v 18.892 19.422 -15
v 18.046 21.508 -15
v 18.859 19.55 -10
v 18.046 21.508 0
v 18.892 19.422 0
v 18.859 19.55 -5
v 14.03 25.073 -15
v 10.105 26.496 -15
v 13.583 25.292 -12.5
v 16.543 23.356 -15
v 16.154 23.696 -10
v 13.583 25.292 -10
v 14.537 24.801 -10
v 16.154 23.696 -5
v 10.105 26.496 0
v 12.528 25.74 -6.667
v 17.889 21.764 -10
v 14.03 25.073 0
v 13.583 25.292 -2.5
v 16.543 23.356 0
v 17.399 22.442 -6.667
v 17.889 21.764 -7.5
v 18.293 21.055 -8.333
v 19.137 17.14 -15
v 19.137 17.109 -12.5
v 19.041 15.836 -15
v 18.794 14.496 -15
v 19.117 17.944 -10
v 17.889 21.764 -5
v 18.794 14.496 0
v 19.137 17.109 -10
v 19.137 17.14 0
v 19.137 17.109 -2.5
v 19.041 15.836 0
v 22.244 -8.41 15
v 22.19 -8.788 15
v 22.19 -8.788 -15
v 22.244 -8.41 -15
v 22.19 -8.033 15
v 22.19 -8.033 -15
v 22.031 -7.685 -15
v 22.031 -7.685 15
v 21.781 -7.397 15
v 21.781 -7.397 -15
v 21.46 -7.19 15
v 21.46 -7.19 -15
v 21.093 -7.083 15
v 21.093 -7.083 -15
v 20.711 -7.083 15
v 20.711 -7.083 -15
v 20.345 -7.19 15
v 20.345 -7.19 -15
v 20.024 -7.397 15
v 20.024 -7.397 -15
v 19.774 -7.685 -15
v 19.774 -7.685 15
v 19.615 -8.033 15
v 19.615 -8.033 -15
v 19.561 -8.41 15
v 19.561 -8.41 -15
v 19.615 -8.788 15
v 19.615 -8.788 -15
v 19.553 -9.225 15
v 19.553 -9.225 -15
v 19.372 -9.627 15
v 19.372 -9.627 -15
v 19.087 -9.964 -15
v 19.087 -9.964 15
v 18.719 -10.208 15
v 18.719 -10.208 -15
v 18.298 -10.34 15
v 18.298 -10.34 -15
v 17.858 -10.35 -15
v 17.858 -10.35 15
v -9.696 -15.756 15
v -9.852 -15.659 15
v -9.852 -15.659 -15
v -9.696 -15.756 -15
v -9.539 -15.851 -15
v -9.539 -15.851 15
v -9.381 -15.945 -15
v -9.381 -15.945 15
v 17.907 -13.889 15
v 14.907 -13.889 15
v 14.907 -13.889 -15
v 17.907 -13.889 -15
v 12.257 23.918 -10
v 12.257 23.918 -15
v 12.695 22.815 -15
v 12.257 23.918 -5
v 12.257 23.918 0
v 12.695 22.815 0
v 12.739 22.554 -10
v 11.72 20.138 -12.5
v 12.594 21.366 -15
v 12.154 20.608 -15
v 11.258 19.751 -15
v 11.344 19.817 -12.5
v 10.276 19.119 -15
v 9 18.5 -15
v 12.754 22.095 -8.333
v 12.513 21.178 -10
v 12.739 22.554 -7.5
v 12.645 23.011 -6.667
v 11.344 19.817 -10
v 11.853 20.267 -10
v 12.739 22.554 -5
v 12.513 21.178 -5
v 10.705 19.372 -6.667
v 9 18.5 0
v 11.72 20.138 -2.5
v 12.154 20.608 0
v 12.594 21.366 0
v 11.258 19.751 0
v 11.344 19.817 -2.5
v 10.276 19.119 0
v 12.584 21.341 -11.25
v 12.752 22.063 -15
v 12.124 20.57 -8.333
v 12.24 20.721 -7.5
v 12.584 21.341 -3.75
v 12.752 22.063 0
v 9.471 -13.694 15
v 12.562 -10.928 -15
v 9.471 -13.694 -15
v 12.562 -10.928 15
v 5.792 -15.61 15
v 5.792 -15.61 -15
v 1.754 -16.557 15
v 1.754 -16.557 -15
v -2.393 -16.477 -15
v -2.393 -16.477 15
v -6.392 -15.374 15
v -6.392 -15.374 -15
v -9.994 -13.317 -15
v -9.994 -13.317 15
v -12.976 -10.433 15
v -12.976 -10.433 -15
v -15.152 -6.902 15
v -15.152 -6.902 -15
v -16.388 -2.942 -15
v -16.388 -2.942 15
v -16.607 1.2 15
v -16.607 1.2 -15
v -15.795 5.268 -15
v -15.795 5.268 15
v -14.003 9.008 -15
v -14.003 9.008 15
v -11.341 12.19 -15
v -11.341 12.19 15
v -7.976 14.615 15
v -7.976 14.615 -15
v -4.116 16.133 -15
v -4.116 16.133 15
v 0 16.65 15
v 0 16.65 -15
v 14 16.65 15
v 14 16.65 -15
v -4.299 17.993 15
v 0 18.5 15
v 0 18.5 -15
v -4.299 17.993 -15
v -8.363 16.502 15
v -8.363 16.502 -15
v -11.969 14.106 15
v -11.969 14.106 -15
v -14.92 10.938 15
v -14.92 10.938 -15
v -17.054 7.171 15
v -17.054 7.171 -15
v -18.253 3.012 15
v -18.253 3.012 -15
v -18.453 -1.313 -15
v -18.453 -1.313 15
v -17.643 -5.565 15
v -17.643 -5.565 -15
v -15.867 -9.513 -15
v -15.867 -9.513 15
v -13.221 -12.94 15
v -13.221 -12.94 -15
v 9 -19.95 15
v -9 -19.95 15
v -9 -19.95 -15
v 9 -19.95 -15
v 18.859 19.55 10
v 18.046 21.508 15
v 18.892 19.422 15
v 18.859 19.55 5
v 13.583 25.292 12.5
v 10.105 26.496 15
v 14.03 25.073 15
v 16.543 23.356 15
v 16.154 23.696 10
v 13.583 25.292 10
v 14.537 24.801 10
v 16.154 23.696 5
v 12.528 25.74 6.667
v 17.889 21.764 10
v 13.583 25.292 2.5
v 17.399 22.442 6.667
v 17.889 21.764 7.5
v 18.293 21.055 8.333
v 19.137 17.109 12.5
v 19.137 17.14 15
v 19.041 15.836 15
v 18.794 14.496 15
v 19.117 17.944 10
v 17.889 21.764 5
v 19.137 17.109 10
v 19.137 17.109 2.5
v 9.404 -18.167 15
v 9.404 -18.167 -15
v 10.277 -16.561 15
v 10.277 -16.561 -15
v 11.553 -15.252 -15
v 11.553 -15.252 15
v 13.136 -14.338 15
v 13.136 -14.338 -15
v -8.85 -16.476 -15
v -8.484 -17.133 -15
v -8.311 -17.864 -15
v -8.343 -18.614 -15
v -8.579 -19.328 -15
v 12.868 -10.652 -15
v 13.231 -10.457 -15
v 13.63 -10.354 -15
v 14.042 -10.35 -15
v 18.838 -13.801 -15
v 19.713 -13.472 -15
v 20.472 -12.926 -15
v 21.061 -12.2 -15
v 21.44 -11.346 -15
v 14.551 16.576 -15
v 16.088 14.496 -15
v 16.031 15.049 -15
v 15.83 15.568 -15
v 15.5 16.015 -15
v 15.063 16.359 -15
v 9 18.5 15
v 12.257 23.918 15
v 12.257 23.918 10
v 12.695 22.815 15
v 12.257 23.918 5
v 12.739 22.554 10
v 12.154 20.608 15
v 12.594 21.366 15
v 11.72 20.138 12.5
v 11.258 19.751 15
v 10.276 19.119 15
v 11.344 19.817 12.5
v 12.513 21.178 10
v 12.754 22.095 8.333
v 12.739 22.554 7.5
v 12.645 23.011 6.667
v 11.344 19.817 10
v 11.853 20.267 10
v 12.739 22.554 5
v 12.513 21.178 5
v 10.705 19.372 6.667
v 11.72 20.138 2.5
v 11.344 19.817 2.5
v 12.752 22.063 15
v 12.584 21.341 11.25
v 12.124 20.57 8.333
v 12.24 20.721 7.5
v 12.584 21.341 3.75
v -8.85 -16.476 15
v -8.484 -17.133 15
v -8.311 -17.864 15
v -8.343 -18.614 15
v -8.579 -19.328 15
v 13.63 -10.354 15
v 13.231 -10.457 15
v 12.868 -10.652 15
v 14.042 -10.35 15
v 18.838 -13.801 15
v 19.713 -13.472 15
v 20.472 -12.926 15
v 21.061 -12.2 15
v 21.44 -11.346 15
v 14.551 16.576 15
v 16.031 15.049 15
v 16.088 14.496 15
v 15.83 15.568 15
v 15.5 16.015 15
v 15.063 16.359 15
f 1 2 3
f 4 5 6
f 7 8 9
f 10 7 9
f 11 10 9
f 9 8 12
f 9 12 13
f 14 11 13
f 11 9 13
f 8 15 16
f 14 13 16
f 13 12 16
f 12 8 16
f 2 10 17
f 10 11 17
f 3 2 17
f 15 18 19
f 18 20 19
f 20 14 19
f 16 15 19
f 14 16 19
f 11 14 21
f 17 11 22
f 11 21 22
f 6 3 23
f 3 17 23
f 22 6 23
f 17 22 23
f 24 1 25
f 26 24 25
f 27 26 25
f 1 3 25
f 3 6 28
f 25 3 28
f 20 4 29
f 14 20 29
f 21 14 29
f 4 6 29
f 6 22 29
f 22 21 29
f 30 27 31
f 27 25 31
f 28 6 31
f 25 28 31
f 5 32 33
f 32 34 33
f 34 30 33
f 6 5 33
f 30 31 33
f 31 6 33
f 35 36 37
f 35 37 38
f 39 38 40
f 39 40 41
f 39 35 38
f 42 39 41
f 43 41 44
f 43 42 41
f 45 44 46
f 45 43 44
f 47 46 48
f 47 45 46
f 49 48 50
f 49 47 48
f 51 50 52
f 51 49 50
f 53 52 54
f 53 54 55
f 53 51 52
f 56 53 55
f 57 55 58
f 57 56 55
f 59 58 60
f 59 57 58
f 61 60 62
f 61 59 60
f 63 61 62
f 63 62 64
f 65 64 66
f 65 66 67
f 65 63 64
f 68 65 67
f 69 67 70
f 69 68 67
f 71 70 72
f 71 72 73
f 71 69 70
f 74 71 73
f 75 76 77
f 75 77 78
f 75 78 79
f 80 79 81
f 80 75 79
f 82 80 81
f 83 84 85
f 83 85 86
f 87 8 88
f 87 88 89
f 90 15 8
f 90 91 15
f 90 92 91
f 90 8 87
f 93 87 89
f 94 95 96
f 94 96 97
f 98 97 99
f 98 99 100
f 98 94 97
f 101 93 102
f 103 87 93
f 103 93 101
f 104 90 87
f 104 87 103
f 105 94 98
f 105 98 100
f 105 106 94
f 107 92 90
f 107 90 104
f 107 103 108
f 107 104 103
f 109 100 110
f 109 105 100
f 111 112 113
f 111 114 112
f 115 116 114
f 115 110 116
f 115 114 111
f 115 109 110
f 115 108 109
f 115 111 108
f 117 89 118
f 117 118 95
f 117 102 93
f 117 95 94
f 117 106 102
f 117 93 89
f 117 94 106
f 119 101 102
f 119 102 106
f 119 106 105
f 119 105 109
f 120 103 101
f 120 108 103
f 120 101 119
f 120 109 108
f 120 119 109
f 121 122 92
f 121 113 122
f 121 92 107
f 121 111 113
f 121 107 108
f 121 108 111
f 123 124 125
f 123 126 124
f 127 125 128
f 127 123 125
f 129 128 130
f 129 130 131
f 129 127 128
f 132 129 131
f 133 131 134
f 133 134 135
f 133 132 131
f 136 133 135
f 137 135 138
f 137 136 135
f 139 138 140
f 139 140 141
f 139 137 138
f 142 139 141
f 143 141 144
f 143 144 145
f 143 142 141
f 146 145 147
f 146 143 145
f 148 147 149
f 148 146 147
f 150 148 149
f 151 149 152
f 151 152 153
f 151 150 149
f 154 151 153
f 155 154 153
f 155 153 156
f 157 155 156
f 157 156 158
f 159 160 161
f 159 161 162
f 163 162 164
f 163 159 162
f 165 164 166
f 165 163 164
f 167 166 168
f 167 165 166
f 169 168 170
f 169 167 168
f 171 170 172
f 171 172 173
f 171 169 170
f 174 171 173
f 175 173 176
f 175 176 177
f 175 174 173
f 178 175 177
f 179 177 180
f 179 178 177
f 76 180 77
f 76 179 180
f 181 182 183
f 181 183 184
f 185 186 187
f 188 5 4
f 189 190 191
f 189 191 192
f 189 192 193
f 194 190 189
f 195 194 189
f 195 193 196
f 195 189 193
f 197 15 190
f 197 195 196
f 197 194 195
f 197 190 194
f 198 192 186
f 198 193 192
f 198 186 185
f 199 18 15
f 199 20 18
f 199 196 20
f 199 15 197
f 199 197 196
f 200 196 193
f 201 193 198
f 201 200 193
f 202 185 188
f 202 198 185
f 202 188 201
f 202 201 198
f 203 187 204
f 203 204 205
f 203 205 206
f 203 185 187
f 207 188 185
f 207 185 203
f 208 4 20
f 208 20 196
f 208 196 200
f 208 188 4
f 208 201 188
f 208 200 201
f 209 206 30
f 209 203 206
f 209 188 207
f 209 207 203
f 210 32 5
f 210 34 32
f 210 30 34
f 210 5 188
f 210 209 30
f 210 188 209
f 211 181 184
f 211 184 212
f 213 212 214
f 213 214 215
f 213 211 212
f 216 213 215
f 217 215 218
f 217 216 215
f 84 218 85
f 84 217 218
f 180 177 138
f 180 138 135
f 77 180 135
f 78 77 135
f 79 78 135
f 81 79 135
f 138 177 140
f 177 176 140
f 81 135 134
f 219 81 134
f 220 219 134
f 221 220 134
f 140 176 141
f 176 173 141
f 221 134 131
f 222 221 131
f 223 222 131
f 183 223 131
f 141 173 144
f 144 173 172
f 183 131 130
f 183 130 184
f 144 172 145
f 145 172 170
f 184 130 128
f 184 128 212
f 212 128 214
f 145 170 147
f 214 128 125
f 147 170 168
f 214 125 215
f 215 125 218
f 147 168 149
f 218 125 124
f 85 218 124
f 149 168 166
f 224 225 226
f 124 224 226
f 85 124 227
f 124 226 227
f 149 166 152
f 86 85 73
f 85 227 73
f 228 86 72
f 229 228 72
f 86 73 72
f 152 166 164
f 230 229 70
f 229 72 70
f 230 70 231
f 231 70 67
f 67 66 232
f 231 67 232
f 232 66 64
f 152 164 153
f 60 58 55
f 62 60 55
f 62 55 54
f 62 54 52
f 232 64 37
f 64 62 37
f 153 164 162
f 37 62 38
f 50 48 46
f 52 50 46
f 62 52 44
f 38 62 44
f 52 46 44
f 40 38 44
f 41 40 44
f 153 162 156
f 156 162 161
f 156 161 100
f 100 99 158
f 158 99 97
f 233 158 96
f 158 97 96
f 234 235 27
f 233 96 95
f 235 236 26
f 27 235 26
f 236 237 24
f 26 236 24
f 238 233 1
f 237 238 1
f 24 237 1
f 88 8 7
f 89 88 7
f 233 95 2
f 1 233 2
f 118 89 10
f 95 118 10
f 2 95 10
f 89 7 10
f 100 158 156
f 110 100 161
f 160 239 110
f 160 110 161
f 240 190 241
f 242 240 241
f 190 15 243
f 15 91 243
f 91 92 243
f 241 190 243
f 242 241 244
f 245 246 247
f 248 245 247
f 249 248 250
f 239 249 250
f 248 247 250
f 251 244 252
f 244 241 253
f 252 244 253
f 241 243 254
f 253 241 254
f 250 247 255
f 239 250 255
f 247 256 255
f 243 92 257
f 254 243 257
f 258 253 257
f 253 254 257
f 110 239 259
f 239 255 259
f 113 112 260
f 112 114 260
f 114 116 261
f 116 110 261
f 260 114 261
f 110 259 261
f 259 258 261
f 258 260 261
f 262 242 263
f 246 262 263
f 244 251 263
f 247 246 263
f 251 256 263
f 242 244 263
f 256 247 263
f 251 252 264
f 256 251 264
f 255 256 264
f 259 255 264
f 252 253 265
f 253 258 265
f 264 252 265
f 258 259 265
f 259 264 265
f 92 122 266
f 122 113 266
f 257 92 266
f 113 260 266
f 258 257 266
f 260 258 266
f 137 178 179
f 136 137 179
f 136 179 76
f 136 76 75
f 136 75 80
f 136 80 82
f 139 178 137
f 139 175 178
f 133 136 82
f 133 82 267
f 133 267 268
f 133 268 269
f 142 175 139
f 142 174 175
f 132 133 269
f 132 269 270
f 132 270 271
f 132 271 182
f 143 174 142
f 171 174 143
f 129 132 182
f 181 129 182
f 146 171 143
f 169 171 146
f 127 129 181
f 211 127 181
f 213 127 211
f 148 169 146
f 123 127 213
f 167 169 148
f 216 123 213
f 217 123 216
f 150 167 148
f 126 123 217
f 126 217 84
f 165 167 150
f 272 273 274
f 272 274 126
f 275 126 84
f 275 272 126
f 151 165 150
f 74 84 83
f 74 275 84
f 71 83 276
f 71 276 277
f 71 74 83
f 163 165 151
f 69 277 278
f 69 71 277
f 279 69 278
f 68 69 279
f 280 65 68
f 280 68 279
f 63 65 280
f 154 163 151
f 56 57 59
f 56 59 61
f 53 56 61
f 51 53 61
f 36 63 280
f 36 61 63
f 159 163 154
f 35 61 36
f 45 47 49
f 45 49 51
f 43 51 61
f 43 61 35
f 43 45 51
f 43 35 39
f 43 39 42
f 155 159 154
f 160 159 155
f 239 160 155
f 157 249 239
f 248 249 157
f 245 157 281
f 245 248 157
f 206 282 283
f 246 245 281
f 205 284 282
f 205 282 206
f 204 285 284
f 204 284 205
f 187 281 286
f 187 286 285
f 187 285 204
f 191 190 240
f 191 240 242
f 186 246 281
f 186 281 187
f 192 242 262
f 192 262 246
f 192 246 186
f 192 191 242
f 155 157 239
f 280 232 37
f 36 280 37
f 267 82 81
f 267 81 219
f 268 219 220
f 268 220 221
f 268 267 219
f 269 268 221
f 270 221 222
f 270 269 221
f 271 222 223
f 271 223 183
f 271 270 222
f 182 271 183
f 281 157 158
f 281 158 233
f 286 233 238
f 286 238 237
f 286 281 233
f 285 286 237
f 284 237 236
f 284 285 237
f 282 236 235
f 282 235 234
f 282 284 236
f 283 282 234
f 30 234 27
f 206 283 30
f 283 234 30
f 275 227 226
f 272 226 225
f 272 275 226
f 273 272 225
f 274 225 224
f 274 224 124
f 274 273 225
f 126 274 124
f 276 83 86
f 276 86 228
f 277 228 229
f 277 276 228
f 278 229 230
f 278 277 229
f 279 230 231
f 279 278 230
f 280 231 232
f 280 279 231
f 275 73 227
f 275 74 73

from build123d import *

# Parameters (mm, degrees)
F1_DEPTH = 15


with BuildPart() as f1:
    # F0 (on Top) → F1 (new body, symmetric)
    with BuildSketch(Plane.XY):
        with BuildLine():
            ThreePointArc((12.562231, -10.927619), (-15.152019, -6.902088), (0, 16.65))
            Line((0, 16.65), (14, 16.65))
            ThreePointArc((14, 16.65), (15.5, 16.01501), (16.088171, 14.496041))
            Line((16.088171, 14.496041), (18.793797, 14.496041))
            add(Edge.make_bspline(
                [(10.105219, 26.496041), (18.016234, 24.516107), (20.053543, 19.857231), (18.793797, 14.496041)],
                knots=[0, 0, 0, 0, 14.815242, 14.815242, 14.815242, 14.815242], degree=3))
            add(Edge.make_bspline(
                [(10.105219, 26.496041), (12.580878, 24.072407), (15.021241, 21.072751), (9, 18.5)],
                knots=[0, 0, 0, 0, 8.072061, 8.072061, 8.072061, 8.072061], degree=3))
            Line((9, 18.5), (0, 18.5))
            ThreePointArc((0, 18.5), (-17.775458, 5.126704), (-9.851839, -15.658585))
            ThreePointArc((-9.851839, -15.658585), (-9.609354, -15.789858), (-9.381345, -15.944917))
            ThreePointArc((-9.381345, -15.944917), (-8.310595, -17.863662), (-9, -19.95))
            Line((-9, -19.95), (9, -19.95))
            ThreePointArc((9, -19.95), (10.869586, -15.862711), (14.907399, -13.888538))
            Line((14.907399, -13.888538), (17.907399, -13.888538))
            ThreePointArc((17.907399, -13.888538), (20.110659, -13.224193), (21.440358, -11.345999))
            Line((21.440358, -11.345999), (22.189979, -8.788404))
            ThreePointArc((22.189979, -8.788404), (20.902351, -7.06921), (19.614723, -8.788404))
            ThreePointArc((19.614723, -8.788404), (19.086815, -9.963811), (17.857542, -10.35002))
            Line((17.857542, -10.35002), (14.042224, -10.35002))
            ThreePointArc((14.042224, -10.35002), (13.231128, -10.456638), (12.562231, -10.927619))
        make_face()
        with BuildLine():
            ThreePointArc((-9.381345, -15.944917), (-9.609354, -15.789858), (-9.851839, -15.658585))
            ThreePointArc((-9.851839, -15.658585), (-9.617657, -15.803502), (-9.381345, -15.944917))
        make_face()
    extrude(amount=F1_DEPTH, both=True)


solid = f1.part
